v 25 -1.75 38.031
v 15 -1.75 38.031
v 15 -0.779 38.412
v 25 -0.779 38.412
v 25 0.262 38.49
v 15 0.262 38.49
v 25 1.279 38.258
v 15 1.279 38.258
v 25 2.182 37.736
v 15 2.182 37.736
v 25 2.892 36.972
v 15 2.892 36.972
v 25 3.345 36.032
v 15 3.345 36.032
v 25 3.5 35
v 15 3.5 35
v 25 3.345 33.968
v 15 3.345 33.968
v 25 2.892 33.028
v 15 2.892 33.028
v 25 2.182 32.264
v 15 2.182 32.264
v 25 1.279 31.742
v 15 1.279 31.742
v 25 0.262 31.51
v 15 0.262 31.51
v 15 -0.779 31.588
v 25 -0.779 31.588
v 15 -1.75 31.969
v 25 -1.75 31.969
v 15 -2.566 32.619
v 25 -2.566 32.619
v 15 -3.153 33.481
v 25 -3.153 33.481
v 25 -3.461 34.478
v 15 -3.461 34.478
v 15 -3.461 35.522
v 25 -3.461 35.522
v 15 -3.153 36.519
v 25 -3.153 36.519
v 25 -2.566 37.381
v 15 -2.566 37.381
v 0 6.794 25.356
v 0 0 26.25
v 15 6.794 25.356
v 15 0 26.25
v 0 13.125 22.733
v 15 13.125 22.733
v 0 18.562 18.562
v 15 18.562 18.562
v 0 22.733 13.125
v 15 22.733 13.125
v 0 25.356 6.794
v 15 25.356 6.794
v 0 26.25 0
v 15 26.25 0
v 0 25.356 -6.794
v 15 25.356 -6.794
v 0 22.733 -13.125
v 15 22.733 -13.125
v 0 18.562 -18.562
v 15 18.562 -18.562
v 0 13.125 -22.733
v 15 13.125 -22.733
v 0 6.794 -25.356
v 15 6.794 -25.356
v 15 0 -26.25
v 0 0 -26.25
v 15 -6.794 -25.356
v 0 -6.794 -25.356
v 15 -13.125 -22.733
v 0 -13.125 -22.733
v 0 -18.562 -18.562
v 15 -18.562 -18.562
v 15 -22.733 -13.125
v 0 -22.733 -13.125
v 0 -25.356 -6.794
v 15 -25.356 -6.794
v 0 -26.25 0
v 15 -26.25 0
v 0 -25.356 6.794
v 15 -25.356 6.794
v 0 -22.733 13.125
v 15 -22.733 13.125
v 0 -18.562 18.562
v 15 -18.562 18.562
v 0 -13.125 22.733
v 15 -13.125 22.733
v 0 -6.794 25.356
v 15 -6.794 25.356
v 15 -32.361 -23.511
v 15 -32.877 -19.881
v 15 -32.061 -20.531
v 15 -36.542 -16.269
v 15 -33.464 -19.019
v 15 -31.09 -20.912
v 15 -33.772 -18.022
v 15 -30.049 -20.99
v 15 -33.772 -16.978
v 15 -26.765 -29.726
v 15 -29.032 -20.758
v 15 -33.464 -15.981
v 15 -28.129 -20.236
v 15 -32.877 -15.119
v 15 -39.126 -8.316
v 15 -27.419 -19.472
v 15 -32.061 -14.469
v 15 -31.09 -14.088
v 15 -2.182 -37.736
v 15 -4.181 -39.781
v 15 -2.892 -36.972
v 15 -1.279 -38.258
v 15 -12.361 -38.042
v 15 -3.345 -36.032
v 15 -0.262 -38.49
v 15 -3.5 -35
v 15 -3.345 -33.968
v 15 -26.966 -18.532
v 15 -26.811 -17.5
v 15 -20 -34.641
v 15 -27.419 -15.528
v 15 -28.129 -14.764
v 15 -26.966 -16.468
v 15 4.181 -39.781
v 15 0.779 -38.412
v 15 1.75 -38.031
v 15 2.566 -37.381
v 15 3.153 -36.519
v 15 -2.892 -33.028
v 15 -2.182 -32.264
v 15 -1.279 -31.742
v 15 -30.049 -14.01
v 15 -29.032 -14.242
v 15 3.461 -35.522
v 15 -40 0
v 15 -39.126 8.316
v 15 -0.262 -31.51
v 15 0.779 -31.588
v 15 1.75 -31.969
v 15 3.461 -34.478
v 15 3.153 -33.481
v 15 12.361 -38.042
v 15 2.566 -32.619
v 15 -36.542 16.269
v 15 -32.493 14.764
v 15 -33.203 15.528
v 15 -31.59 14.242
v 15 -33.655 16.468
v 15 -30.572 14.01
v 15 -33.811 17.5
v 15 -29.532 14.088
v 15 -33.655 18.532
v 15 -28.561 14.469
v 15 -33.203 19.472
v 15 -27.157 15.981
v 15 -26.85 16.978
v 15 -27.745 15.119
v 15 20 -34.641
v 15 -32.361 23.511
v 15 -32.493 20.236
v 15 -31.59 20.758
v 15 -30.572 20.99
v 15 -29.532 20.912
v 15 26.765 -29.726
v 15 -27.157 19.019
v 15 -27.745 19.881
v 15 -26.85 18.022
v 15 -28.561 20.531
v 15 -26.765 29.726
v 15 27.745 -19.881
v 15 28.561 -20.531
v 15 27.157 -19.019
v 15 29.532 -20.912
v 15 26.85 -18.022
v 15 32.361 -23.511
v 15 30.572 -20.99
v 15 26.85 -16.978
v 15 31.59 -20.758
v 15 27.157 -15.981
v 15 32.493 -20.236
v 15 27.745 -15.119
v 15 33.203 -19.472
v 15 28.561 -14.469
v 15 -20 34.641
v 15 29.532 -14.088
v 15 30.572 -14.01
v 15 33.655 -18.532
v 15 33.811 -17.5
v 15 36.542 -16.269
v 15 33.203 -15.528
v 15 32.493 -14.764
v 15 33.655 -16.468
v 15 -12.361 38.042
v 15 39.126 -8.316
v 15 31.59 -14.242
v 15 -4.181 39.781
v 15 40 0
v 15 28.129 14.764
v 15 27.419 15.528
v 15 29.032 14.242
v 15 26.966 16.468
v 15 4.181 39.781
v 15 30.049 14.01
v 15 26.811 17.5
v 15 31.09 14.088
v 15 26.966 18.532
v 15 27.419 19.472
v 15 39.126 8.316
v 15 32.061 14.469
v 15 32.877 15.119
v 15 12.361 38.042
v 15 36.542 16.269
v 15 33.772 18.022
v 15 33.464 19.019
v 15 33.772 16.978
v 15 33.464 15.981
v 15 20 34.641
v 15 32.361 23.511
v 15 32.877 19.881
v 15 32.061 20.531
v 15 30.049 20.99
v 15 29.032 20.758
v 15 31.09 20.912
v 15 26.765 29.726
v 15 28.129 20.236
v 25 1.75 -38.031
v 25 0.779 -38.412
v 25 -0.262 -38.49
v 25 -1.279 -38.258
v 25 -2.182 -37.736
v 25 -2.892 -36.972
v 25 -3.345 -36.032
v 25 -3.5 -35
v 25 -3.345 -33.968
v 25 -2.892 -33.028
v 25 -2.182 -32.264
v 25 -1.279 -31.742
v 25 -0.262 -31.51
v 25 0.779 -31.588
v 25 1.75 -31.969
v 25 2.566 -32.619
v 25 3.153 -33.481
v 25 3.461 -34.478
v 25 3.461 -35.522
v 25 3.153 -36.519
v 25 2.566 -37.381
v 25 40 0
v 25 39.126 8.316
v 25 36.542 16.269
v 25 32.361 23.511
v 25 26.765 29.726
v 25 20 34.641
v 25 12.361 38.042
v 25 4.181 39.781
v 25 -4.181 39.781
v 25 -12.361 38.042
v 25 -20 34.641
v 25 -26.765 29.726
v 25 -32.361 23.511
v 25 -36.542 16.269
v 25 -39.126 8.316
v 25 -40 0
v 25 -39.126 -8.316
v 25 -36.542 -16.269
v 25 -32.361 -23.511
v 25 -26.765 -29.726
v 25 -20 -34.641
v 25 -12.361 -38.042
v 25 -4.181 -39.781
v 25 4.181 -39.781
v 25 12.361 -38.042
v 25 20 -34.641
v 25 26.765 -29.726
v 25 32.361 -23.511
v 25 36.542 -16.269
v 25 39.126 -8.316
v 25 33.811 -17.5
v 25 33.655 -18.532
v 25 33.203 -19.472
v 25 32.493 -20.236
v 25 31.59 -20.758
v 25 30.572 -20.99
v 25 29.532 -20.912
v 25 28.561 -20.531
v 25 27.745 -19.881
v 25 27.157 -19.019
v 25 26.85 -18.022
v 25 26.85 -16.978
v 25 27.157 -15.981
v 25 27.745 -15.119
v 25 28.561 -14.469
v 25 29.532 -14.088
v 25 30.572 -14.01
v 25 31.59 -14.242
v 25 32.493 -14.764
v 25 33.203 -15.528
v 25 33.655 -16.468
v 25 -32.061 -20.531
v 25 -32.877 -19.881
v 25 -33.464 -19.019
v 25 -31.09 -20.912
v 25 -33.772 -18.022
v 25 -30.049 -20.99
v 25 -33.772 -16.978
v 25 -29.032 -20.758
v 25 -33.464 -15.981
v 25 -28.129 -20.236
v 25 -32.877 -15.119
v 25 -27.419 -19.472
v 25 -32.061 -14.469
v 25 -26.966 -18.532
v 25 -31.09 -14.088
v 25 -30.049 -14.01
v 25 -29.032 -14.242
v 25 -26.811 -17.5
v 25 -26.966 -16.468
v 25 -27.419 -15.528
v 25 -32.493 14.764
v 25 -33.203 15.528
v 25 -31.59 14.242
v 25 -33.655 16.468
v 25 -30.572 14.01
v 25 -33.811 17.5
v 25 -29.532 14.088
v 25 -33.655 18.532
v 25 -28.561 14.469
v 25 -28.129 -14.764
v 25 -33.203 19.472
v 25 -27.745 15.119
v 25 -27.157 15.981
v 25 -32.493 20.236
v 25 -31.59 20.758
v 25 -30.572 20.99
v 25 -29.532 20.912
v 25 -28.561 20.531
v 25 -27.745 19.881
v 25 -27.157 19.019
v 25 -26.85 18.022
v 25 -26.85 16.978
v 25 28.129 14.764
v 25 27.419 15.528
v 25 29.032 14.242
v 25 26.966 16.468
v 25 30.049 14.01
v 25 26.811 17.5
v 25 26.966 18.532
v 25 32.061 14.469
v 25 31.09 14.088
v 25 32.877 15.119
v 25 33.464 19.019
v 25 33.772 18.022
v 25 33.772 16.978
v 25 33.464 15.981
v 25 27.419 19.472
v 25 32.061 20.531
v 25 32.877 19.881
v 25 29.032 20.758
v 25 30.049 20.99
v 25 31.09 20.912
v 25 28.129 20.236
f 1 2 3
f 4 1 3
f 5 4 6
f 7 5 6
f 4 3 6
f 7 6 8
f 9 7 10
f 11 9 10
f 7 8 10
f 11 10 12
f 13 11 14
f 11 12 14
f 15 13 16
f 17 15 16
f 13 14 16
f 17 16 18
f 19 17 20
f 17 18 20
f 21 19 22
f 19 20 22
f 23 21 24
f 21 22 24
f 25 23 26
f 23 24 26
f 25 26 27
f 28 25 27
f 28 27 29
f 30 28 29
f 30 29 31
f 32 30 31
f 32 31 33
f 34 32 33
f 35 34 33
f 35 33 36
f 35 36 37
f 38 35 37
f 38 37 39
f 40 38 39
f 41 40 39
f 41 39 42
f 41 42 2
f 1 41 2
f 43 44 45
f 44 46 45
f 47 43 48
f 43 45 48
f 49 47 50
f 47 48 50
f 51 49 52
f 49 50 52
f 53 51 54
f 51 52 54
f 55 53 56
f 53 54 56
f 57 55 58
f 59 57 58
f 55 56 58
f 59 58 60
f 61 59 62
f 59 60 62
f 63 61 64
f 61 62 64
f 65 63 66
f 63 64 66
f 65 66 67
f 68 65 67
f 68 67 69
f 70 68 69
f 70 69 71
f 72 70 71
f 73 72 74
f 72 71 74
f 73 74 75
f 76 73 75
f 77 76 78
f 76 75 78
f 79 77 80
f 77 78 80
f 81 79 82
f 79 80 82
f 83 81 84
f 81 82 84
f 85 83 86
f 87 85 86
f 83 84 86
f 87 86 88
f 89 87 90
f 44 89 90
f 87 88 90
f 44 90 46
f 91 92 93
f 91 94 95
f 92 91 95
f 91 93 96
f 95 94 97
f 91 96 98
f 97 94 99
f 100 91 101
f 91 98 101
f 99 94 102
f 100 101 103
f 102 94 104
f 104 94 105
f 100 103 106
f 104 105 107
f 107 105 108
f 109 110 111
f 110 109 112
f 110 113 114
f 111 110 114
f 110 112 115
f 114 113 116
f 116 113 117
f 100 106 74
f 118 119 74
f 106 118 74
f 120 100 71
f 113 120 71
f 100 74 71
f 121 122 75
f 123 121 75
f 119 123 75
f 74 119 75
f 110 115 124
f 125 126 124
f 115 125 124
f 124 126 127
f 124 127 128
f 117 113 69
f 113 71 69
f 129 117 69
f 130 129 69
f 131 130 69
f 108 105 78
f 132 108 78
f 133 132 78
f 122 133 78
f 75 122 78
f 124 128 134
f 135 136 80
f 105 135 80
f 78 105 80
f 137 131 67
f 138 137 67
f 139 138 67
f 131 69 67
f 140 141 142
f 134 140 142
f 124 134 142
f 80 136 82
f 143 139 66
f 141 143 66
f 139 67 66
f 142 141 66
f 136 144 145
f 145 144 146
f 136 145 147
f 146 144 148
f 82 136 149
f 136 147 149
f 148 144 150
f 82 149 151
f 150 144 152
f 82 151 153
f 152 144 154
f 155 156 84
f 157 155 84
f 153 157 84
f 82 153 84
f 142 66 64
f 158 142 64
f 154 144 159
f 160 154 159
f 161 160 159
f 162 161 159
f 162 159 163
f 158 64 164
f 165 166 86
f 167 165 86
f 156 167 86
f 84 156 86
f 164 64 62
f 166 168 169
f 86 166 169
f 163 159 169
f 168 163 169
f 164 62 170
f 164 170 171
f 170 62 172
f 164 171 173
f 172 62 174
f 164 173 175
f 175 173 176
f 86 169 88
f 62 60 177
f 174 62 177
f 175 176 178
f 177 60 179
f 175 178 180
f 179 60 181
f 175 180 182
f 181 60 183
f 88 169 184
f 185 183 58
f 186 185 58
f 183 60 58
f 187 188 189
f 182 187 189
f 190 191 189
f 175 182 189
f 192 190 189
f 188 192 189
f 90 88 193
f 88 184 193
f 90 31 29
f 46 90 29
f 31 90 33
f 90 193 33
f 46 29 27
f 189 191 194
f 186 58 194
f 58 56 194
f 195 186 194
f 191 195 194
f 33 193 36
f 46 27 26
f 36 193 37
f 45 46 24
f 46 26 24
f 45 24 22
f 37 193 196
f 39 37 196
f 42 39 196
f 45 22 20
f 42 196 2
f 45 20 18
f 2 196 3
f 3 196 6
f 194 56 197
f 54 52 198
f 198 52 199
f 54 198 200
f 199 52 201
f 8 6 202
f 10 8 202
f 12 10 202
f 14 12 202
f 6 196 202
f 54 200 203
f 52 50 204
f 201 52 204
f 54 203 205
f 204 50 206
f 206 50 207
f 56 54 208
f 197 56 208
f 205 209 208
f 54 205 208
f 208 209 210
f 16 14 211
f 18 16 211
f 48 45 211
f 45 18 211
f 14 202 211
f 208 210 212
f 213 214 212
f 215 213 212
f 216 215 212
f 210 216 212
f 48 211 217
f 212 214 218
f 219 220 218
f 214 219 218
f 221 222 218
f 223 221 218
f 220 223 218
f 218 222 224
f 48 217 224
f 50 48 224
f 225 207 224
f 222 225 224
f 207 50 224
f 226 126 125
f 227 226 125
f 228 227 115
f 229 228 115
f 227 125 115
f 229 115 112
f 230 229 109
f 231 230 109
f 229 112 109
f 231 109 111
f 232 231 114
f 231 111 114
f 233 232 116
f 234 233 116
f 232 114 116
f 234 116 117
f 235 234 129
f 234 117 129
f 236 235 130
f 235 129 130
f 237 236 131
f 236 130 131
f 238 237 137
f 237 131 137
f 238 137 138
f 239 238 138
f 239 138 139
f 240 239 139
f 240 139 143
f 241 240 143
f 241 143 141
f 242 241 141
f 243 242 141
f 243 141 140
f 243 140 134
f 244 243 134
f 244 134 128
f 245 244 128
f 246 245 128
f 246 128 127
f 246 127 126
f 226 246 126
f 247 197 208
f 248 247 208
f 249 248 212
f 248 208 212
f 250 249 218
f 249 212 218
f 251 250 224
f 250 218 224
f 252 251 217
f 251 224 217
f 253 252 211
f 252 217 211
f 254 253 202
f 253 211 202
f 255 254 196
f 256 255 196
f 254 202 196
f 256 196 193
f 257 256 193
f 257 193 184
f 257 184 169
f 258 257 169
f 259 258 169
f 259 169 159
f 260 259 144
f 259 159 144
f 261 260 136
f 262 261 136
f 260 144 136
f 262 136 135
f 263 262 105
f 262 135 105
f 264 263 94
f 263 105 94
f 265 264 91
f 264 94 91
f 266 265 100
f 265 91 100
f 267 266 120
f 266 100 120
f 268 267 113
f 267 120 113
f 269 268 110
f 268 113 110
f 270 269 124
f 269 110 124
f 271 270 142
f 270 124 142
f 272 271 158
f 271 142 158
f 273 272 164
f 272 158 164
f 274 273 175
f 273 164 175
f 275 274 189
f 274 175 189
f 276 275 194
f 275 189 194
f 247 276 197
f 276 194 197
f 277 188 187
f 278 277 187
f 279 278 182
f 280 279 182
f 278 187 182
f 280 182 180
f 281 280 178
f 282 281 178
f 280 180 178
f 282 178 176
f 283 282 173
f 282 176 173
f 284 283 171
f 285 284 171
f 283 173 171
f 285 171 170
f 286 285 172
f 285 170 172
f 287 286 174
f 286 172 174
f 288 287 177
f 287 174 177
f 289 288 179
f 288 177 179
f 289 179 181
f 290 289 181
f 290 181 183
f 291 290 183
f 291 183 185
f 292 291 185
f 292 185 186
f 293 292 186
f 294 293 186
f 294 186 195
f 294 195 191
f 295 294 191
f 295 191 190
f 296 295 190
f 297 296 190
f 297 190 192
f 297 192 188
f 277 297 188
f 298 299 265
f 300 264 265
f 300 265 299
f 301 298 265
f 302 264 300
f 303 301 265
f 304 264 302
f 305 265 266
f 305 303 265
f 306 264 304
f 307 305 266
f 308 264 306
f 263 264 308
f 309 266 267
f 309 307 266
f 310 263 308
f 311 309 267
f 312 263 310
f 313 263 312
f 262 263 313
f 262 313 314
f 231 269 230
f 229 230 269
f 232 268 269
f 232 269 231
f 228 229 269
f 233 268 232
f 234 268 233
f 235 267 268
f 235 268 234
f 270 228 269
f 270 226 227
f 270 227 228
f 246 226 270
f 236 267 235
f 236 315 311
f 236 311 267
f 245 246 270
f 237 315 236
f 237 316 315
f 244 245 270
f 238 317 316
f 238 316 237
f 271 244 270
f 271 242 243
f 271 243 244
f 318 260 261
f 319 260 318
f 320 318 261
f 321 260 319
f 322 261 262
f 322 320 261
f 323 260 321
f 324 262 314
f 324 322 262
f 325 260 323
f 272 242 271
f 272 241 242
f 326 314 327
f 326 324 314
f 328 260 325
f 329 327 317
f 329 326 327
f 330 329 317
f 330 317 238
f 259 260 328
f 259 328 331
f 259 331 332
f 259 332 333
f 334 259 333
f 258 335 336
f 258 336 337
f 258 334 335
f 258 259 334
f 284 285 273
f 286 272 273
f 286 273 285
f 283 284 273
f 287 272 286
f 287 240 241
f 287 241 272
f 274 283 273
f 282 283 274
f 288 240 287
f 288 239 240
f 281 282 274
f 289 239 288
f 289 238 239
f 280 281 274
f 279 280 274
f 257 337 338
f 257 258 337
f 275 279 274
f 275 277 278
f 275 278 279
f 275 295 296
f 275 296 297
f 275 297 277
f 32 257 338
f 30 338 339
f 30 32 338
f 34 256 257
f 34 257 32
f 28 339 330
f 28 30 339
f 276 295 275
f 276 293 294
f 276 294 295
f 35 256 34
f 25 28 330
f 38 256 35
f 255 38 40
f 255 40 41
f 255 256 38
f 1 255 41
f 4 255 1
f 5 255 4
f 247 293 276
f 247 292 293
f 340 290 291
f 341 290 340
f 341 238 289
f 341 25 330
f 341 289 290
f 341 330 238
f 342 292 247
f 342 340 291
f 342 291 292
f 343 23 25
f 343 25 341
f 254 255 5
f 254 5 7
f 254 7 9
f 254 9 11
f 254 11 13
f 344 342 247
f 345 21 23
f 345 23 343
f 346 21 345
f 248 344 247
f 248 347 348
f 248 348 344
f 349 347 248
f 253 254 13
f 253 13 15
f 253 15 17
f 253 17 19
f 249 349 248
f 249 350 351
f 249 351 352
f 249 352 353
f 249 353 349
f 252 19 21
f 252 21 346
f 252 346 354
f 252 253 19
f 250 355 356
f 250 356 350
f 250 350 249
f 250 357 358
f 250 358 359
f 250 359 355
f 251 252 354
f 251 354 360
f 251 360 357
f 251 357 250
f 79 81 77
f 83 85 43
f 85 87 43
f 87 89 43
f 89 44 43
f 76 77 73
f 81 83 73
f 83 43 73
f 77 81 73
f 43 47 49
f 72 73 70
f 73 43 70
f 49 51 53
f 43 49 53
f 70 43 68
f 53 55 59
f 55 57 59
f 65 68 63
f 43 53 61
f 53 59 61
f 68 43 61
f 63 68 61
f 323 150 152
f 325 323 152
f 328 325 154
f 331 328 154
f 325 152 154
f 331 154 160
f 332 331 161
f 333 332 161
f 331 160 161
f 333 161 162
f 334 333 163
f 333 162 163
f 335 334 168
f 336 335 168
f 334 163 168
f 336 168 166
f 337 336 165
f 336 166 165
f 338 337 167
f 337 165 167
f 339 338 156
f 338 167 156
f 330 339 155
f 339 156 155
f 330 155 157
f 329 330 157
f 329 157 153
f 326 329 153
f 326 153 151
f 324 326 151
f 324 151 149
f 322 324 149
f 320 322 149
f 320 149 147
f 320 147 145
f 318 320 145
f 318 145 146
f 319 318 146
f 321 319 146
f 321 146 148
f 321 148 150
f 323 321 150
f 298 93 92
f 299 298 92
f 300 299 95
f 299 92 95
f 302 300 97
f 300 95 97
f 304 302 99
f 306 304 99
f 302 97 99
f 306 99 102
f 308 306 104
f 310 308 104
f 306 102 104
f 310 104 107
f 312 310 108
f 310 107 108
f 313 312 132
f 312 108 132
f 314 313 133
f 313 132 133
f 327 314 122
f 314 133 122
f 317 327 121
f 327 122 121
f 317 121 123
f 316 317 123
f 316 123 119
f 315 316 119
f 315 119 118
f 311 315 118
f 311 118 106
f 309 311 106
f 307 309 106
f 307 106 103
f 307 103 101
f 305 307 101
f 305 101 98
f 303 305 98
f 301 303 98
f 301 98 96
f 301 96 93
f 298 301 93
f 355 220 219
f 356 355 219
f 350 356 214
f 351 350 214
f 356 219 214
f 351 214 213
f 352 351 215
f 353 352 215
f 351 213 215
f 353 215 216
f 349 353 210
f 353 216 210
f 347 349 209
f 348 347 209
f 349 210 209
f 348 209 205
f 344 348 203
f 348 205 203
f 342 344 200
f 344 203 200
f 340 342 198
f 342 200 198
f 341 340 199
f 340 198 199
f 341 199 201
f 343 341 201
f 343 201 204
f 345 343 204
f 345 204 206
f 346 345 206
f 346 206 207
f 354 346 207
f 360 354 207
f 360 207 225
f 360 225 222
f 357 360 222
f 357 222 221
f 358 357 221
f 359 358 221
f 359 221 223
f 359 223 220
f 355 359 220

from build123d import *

# Parameters (mm, degrees)
F0_W            = 15
F0_H            = 26.25
F2_R            = 40
F2_R_2          = 26.25
F3_DEPTH        = 10
F4_R            = 3.5
F5_DEPTH        = 25.001
F5_COPIES_COUNT = 6


# Not quite as in the source:
# - a pattern or mirror of a feature is missing from the dataset's text; its kind, count and spacing are read off the source's solid


with BuildPart() as f1:
    # F0 (on Front) → F1 (revolve)
    with BuildSketch(Plane.XZ):
        with Locations((7.5, 13.125)):
            Rectangle(F0_W, F0_H)
    revolve(axis=Axis((-28.7704151153, 0, 0), (-1, 0, 0)))

    # F2 (on face) → F3 (join)
    with BuildSketch(Plane.YZ.offset(15)):
        Circle(F2_R)
        Circle(F2_R_2, mode=Mode.SUBTRACT)
        Circle(F2_R_2)
    extrude(amount=F3_DEPTH)

    # F4 (on face) → F5 (cut, through all)
    with BuildSketch(Plane(origin=(0, 0, 0), x_dir=(0, -1, 0), z_dir=(-1, 0, 0))):
        with Locations((30.3108891325, 17.5)):
            Circle(F4_R)
    f5 = extrude(amount=-F5_DEPTH, mode=Mode.SUBTRACT)

    # F5_copies: F5 ×6 about axis
    f5_copies_axis = Axis((0, 0, 0), (1, 0, 0))
    for i in range(1, F5_COPIES_COUNT):
        add(f5.rotate(f5_copies_axis, i * 360 / F5_COPIES_COUNT), mode=Mode.SUBTRACT)


solid = f1.part
